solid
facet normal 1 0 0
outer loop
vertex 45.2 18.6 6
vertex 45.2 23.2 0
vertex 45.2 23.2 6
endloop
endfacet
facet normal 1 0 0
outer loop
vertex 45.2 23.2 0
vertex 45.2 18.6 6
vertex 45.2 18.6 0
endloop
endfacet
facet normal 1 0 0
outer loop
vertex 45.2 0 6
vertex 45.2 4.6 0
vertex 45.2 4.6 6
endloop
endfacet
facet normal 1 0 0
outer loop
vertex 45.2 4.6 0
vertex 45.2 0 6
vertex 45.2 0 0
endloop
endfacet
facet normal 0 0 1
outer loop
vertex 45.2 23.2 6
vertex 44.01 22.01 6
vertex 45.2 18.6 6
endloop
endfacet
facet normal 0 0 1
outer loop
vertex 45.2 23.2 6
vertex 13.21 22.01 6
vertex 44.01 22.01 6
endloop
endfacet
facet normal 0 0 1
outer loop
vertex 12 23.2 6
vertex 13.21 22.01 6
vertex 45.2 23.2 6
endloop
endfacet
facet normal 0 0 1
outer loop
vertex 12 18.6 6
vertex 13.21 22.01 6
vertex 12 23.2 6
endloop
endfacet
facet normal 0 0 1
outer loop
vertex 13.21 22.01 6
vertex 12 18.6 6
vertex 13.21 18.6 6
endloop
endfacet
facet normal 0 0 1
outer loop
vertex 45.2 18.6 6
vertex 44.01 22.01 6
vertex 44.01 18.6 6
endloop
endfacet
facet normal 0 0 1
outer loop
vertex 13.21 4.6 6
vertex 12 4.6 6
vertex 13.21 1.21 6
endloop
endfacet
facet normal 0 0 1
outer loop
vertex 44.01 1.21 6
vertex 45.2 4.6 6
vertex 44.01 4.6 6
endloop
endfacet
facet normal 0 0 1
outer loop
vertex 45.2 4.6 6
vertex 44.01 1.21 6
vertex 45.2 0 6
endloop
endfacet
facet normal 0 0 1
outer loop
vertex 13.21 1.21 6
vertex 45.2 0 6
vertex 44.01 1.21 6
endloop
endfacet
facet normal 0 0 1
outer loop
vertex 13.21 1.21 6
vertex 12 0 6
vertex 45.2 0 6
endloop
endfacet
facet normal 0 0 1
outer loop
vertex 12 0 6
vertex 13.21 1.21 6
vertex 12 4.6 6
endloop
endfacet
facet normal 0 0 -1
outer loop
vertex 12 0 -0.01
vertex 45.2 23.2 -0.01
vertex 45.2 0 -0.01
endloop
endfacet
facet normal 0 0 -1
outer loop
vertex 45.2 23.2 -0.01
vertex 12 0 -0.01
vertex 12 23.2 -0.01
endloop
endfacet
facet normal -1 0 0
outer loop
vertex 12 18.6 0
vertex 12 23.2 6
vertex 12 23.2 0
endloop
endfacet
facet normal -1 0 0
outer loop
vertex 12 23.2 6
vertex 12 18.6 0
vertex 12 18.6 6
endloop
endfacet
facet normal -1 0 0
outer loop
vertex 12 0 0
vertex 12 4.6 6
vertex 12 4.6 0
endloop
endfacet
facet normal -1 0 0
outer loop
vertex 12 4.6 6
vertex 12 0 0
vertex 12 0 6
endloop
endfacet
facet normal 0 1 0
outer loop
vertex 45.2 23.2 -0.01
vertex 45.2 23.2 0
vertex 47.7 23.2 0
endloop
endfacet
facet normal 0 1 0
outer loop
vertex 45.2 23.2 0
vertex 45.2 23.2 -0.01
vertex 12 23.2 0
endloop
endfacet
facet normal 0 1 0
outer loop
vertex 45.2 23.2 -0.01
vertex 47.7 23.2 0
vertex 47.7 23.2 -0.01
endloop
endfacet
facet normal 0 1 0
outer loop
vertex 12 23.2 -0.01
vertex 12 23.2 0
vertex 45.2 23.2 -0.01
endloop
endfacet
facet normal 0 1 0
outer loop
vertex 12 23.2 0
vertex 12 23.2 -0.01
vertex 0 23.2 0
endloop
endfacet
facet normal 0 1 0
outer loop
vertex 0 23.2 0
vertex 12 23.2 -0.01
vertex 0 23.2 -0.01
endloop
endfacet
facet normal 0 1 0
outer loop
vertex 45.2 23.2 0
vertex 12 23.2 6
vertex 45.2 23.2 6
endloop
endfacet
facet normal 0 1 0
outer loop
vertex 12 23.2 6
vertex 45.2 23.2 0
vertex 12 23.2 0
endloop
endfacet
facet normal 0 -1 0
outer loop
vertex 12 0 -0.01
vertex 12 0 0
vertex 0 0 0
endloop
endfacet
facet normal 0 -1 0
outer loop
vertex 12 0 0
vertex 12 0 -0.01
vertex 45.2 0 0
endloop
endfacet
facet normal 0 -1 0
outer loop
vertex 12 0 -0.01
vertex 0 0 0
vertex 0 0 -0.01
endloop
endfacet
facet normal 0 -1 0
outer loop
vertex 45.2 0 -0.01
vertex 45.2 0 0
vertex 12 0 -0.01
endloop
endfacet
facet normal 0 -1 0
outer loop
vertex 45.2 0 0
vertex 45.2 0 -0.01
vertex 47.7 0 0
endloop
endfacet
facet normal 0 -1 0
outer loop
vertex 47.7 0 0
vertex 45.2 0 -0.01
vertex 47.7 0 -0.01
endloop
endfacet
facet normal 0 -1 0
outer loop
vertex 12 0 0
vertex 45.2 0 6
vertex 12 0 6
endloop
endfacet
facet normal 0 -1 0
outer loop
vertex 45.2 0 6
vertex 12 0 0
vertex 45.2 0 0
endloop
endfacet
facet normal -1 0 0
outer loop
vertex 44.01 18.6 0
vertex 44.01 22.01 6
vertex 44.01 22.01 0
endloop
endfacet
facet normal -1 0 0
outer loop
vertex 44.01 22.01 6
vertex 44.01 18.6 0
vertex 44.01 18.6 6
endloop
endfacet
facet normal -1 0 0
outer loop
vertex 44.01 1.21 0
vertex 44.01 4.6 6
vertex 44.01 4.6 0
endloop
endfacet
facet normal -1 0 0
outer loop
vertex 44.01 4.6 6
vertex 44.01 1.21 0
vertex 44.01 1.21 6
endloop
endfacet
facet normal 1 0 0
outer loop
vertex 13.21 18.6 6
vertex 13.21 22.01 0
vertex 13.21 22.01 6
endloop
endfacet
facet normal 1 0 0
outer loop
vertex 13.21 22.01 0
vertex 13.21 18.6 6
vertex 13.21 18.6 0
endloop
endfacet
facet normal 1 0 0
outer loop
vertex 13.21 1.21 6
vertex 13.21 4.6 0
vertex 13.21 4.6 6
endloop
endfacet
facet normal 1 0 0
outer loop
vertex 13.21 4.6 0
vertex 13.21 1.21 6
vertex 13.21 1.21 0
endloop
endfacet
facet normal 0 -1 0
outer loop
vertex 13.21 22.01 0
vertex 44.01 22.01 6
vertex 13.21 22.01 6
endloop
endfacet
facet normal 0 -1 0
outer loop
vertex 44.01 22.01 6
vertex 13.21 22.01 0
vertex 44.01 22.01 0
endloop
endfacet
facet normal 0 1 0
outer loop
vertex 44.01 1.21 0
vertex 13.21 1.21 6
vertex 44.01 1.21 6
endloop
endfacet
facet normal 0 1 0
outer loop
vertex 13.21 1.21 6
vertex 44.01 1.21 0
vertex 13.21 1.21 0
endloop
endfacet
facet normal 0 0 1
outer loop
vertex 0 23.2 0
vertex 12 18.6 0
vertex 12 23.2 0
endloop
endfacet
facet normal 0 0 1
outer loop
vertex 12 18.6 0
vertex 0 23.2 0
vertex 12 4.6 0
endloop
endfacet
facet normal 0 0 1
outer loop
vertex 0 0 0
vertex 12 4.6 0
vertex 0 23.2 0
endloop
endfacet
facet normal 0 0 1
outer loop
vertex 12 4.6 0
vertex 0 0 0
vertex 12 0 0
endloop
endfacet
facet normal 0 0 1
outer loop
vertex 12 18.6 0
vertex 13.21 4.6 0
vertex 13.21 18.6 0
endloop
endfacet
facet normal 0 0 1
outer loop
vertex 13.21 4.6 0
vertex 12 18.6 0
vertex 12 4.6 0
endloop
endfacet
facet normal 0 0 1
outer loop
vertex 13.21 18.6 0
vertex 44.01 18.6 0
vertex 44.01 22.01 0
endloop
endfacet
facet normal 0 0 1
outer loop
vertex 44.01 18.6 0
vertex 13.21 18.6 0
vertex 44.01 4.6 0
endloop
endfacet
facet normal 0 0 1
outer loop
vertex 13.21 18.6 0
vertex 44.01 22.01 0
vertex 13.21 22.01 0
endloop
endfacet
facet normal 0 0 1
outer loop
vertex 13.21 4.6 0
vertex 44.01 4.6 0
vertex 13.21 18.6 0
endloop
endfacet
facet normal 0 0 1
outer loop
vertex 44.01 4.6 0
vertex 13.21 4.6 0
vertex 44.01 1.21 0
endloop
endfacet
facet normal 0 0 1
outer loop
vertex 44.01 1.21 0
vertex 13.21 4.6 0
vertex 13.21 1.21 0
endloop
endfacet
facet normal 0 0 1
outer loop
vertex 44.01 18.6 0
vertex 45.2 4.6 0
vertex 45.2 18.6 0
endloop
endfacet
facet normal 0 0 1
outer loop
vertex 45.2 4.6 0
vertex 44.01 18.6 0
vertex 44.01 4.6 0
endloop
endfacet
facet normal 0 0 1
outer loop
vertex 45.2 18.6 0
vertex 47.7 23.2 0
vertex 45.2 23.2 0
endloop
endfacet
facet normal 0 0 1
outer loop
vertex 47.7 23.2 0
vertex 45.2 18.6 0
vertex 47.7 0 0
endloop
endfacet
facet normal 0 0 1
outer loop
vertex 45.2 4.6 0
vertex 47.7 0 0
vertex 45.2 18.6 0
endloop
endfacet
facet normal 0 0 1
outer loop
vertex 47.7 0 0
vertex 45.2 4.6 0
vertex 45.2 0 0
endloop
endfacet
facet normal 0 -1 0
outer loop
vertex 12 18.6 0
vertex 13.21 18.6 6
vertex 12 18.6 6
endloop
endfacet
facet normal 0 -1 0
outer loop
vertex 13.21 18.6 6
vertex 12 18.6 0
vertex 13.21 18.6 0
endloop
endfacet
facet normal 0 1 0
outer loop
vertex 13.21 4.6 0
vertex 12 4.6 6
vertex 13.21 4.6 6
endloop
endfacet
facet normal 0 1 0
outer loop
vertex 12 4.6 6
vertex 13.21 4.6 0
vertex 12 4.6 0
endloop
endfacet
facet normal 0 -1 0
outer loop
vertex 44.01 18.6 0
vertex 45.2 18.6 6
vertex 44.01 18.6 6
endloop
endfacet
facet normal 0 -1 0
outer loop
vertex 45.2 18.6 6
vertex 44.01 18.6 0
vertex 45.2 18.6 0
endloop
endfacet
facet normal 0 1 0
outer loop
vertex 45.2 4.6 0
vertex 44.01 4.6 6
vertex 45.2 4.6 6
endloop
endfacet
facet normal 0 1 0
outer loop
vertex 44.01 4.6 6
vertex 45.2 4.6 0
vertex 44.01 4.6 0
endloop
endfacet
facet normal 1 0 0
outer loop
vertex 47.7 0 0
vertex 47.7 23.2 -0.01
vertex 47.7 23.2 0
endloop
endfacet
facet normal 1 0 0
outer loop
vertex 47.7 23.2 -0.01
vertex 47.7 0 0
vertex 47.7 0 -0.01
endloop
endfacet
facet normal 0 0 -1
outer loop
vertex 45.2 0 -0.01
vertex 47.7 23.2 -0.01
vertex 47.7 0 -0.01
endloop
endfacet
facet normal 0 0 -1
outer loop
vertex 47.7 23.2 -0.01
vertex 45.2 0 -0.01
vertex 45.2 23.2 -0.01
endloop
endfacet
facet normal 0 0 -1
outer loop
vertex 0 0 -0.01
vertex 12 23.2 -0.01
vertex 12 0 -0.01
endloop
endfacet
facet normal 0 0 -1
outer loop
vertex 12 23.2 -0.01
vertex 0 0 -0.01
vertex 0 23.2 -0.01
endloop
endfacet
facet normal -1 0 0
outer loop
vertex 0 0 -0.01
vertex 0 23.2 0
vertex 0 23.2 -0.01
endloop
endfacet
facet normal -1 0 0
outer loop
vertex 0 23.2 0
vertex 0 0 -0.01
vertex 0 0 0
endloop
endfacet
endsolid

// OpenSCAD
// file: ../Base/Boxes.scad
// Fischertechnik Box Foundation
// Pre-designed Boxes

use <Constants.scad>

include <PlacementOptions.scad>

box190Width = 190;
box190Depth = 130;
box130Width = 130;
box130Depth = 95;

// Values are from an original ec3 box
topBottomDifference = 1.5;
outerHeight = 40;
baseThickness = 1.8;
innerHeight = outerHeight - baseThickness;
stackExcess = 5.7;
radius = 3.5;
wallThickness = 1.5;
tolerance = 0.2;

boxWallThickness = wallThickness;
boxBaseThickness = baseThickness;
boxWebWidth = 3.0;

// getBoxWallThickness()
// Gets the wall thickness of a Fischertechnik Box
function getBoxWallThickness() = boxWallThickness;

// getBoxUsageHeight(height = 38.2)
// Gets the usable height of a Fischertechnik box
// height = Outer height of the box from the bottom to the upper edge.
function getBoxUsageHeight(height = outerHeight) = height - baseThickness - stackExcess;

// getBoxInnerHeight()
// Gets the inner height of a Fischertechnik box, including the stack excess
function getBoxInnerHeight() = innerHeight;

// getBoxBaseThickness()
// Gets the thickness of the Fischertechnik box base.
function getBoxBaseThickness() = boxBaseThickness;

// getBoxWebWidth()
// Gets the width of a box web
function getBoxWebWidth() = boxWebWidth;

// getBox190Space()
// Gets the usable inner space of a Box 190 as an x/y-list
function getBox190Space() = [
    box190Width - 2*getBoxWallThickness() - topBottomDifference, 
    box190Depth - 2*getBoxWallThickness() - topBottomDifference ];

// RoundedCornerPlate(width, depth, height, radius)
// Creates a body plate with rounded corners for a box. Used
// also to create the complete box with the hull module.
// width = Width of the plate
// depth = depth of the plate 
// height = thickness of the plate
// radius = radius of the rounded corner
module RoundedCornerPlate(width, depth, height, radius) {
    translate([radius, radius])
    hull() {
        w = width-2*radius;
        d = depth-2*radius;
        cube([w, d, height]);
        cylinder(height, r=radius, $fn=getFragments());
        translate([w, 0])
            cylinder(height, r=radius, $fn=getFragments());
        translate([w, d])
            cylinder(height, r=radius, $fn=getFragments());
        translate([0, d])
            cylinder(height, r=radius, $fn=getFragments());
    }
}

// BoxBase(width, depth)
// Creates an empty stackable Fischertechnik compatible box
// width = Outer width of the box (190, 130, ...)
// depth = Outer depth of the box (130, 95, ...)

module BoxBase(width, depth, height=outerHeight) {    
    thinPlate = 0.01;

    innerHeight = height - baseThickness;    
    
    module Body(tolerance=tolerance) {
        hull() {
            // Bottom with tolerance to fit into the original boxes when stacked
            translate([-wallThickness+tolerance, -wallThickness+tolerance, -baseThickness])
                RoundedCornerPlate(width-topBottomDifference-2*tolerance, depth-topBottomDifference-2*tolerance, thinPlate, radius);
            
            // Top
            translate([-wallThickness-topBottomDifference/2, -wallThickness-topBottomDifference/2, innerHeight-thinPlate])
                RoundedCornerPlate(width, depth, thinPlate, radius);
         }
    }

    module Cutoff() {
        hull() {
            coWidth = width - 2*wallThickness;
            coDepth = depth - 2*wallThickness;
            
            // Bottom
            RoundedCornerPlate(coWidth-topBottomDifference, coDepth-topBottomDifference, thinPlate, radius);

            // Top
            translate([-topBottomDifference/2, -topBottomDifference/2, innerHeight+thinPlate]) 
                RoundedCornerPlate(coWidth, coDepth, thinPlate, radius);
        }
    }
    
    difference() {        
        Body();
        Cutoff();
        stackOffset = innerHeight - stackExcess;
        translate([0, 0, stackOffset + baseThickness])
            Body(tolerance=0);
    }
}

// Creates the Fischertechnik empty box 130x190 mm and places it at position 0,0
// 190x130 are the outer sizes, the inner space is slightly smaller. Use getBox190Space() to get the inner sizes.
// The box is positioned that the usable inner space is at the 0,0,0 position.

module Box190() {
    BoxBase(box190Width, box190Depth);
}

// Gets the usable inner space of a Box 130 as an x/y-list
function getBox130Space() = [
    box130Width - 2*getBoxWallThickness() - topBottomDifference, 
    box130Depth - 2*getBoxWallThickness() - topBottomDifference ];

// Creates the Fischertechnik empty box 95x130 mm and places it at position 0,0
// 190x130 are the outer sizes, the inner space is slightly smaller. Use getBox190Space() to get the inner sizes.
// The box is positioned that the usable inner space is at the 0,0,0 position.

module Box130() {
    BoxBase(box130Width, box130Depth);
}

// Creates a web at the specified box walls
// corner 0 = LowerLeft, 1 = UpperLeft, 2 = UpperRight, 3 = LowerRight
// side 0 = LeftOfCorner, 1 = RightOfCorner
// distance = Distance in mm from the corner
// boxSpace = inner width and depth of the box (default: Box 190)
// webWidth = length of the web (default is 3 mms)
// webThickness = thickness of the web (default is 1 mm)
// height = Height of the web (standard is getBoxUsageHeight())
// sink = How much of the web is sunk into the wall

module BoxWeb(
    corner, 
    side, 
    distance, 
    boxSpace=getBox190Space(), 
    webWidth=getBoxWebWidth(), 
    webThickness=1.0, 
    height=getBoxUsageHeight(),
    sink = getBoxWallThickness()/2) {
    width = (corner % 2 == 0) ? 
            (side == LeftOfCorner ? webWidth : webThickness) :
            (side == LeftOfCorner ? webThickness : webWidth);

    depth = (corner % 2 == 0) ? 
            (side == RightOfCorner ? webWidth : webThickness) :
            (side == RightOfCorner ? webThickness : webWidth);
    
    xDiff = corner == LowerLeft ? 
                (side == LeftOfCorner ? -sink : distance) :
            (corner == UpperLeft ?                
                (side == LeftOfCorner ? distance : -sink) :
            (corner == UpperRight ?
                (side == LeftOfCorner ? boxSpace.x-webWidth+sink : boxSpace.x-distance-webThickness) :
                (side == LeftOfCorner ? boxSpace.x-distance-webThickness: boxSpace.x-webWidth+sink)));

    yDiff = corner == LowerLeft ? 
                (side == RightOfCorner ? -sink : distance) :
            (corner == UpperLeft ?
                (side == RightOfCorner ? boxSpace.y-distance-webThickness : boxSpace.y-webWidth+sink) :
            (corner == UpperRight ?
                (side == RightOfCorner ? boxSpace.y-webWidth+sink : boxSpace.y-distance-webThickness) :
                (side == RightOfCorner ? distance : -sink)));
    
    translate([xDiff, yDiff, -getExcess()])
        cube([width, depth, height + 2*getExcess()]);
}
// file: ../Base/Rotation.scad
// Fischertechnik Box Foundation
// Geometry Helpers Rotation

include <PlacementOptions.scad>

// getRotatedSpace(space, rotation=NoRotation)
// Rotates the space dependent on the specified rotation

function getRotatedSpace(space, rotation=NoRotation) = [
    (rotation == Rotate90 || rotation == Rotate270) ? space.y : space.x,
    (rotation == Rotate90 || rotation == Rotate270) ? space.x : space.y
];

// Rotates the given space around the fixed left lower corner
// space = the space the children needs as width/depth list [width,depth]
// rotation = 0 Rotate0 degrees, 1 Rotate90 degrees, 2 Rotate180 degrees, 3 Rotate270 degrees (equivalent to -90)

module RotateFix(space, rotation=NoRotation) {
    dy = (rotation == Rotate0 || rotation == Rotate270) ? 0 :
        (rotation == Rotate90) ? space.x :
        space.y;
    dx = (rotation < Rotate180) ? 0 :
        (rotation == Rotate180) ? space.x :
        space.y;
    
    translate([dx, dy, 0])
        rotate([0, 0, rotations[rotation]])
            children();
}
// file: ../Base/Alignment.scad
// Fischertechnik Box Foundation
// Geometry Helpers Alignment

include <PlacementOptions.scad>

// getAlignedX(elementWidth, spaceWidth, align=AlignRight, offset=0)
// Gets the aligned X offset of an element with the given
// width in the given space.
// elementWidth = The width of the element to positon
// spaceWidth = The space where the element should be aligned
// align = 0 AlignLeft, 1 AlignCenter, 2 AlignRight
// offset = an optional offset from the aligned position. When
// aligned left or centered, then positive values are in X direction.
// When aligned right then positive values are in negative X direction.

function getAlignedX(elementWidth, spaceWidth, align=AlignRight, offset=0) =
    (align == AlignLeft) ?
        offset :
        ((align == AlignCenter) ?
        (spaceWidth - elementWidth)/2 + offset :
        spaceWidth - offset - elementWidth);

// getAlignedY(elementDepth, spaceDepth, align=AlignTop, offset=0)
// Gets the aligned Y offset of an element with the given
// depth in the given space.
// elementDepth = The depth of the element to positon
// spaceDepth = The space where the element should be aligned
// align = 0 AlignBottom, 1 AlignCenter, 2 AlignTop
// offset = an optional offset from the aligned position. When
// aligned bottom or centered, then positive values are in Y direction.
// When aligned top then positive values are in negative Y direction.

function getAlignedY(elementDepth, spaceDepth, align=AlignTop, offset=0) =
    (align == AlignBottom) ?
        offset :
        ((align == AlignCenter) ?
        (spaceDepth - elementDepth)/2 + offset :
        spaceDepth - offset - elementDepth);
// file: ../Base/PlacementOptions.scad
// Fischertechnik Box Foundation
// Placement Options

// Alignment
NoAlign = 0;
AlignLeft = 1;
AlignBottom = 2;
AlignCenter = 3;
AlignRight = 4;
AlignTop = 5;

// Element rotation degree steps
rotations = [0, -90, -180, -270];

// Rotation
NoRotation = 0;
Rotate0 = 0;
Rotate90 = 1;
Rotate180 = 2;
Rotate270 = 3;

// Docking (seen from above)
NoDock = -1;
DockLeft = 0;
DockTop = 1;
DockRight = 2;
DockCorner = 2;
DockBottom = 3;

// Web corners
LowerLeft = 0;
UpperLeft = 1;
UpperRight = 2;
LowerRight = 3;

// Web position relative to corner
LeftOfCorner = 0;
RightOfCorner = 1;

// Rails direction
Horizontal = true;
Vertical = false;
// file: ../Base/Placement.scad
// Fischertechnik Box Foundation
// Geometry Helpers Placement

use <Constants.scad>
use <Alignment.scad>
use <Rotation.scad>
use <Boxes.scad>

include <PlacementOptions.scad>

// Place(x=0, y=0, elementSpace=[0,0], alignX=AlignLeft, alignY=AlignBottom, rotation=Rotate0, boxSpace=getBox190Space())
// Places the child at the specified position
// y = Y-Position. This is a relative position when an X aligment is specified.
// x = X-Position. This is a relative position when an Y aligment is specified.
// elementSpace = space of the element to be placed [x,y]
// alignX = -1=NoAlign, 0 AlignLeft, 1 AlignCenter, 3 AlignRight (elementSpace and boxSpace required!)
// alignY = -1=NoAlign, 2 AlignBottom, 1 AlignCenter, 4 AlignTop (elementSpace and boxSpace required!)
// rotation = 0 Rotate0 0 degrees, 1 Rotate90 90 degrees, 
// 2 Rotate180 180 degrees, 3 Rotate270 270 degrees (equivalent to -90)
// boxSpace = Inner space of the box where the placement occurs [x,y] - default is Box 190x130 inner space

module Place(x=0, y=0, elementSpace=[0,0], 
  alignX=AlignLeft, alignY=AlignBottom, 
  rotation=NoRotation, boxSpace=getBox190Space()) {

    module Position(x, y, space, rotation=Rotate0) {
        translate([x, y, 0])
            RotateFix(space, rotation)
                children();
    }

    space = getRotatedSpace(elementSpace, rotation);
    alignedX = getAlignedX(space.x, boxSpace.x, alignX, x);
    alignedY = getAlignedY(space.y, boxSpace.y, alignY, y);
    Position(alignedX, alignedY, elementSpace, rotation)
        children();
}

// Center(space=getBox130Space(), elementSpace=[0,0])
// space = Space where the children is centered. For cylinder use centered=true and no elementSpace.
// elementSpace = space of the element to be centered [x,y]

module Center(space=getBox190Space(), elementSpace=[0,0]) {
    Place(elementSpace=elementSpace, boxSpace=space, alignX=AlignCenter, alignY=AlignCenter)
        children();
}

// CenterHorizontal(width=0, y=0, offset=0, space=getBox130Space())
// width = Width of the element to be placed.
// y = Y position of the element
// offset = Offset from the center position (negative will be left of the center)
// space = Space where the element is placed

module CenterHorizontal(width=0, y=0, offset=0, space=getBox190Space()) {
    Place(x=offset, y=y, elementSpace=[width, 0], boxSpace=space, alignX=AlignCenter)
        children(0);
}

// CenterVertical(depth=0, x=0, offset=0, space=getBox130Space())
// depth = Depth of the element to be placed.
// x = X position of the element
// offset = Offset from the center position (negative will be down of the center)
// space = Space where the element is placed

module CenterVertical(depth=0, x=0, offset=0, space=getBox190Space()) {
    Place(x=x, y=offset, elementSpace=[0, depth], boxSpace=space, alignY=AlignCenter)
        children(0);
}

// getIsVertical(align)
// True if the specified alignment needs a vertical orientation for a divider (AlignRight, AlignLeft)

function getIsVertical(align) = (align == AlignRight || align == AlignLeft);

// getIsHorizontal(align)
// True if the specified alignment needs a horizontal orientation for a divider (AlignTop, AlignBottom)

function getIsHorizontal(align) = (align == AlignTop || align == AlignBottom);
// file: ../Base/Constants.scad
// Fischertechnik Box Foundation
// Constants

// Constant values necessary for multiple elements

// Base constants
dividerThickness = 1.2;
excess = 0.01;
fragments = 90;
tolerance = 0.8;

// Gets the thickness of a divider 
function getDividerThickness() = dividerThickness;

// Gets the excess that is used to merge walls into each other
function getExcess() = excess;

// Gets amount of fragments of a cylinder
function getFragments() = fragments;

// Gets the inner tolerance of a frame to each side
function getTolerance() = tolerance;


// Fischertechnik specific constants
axisDiameter = 4;
axisBottomDiameter = axisDiameter + 1;
axisTolerance = 0.2;
axisLockingLength = 8;

// Gets axis diameter of Fischertechnik axis
function getAxisDiameter() = axisDiameter;

// Gets axis diameter tolerance (subtracted for element axis)
function getAxisTolerance() = axisTolerance;

// Gets the axis diameter for standing axis
function getStandAxisDiameter() = getAxisDiameter() - getAxisTolerance();

// Gets axis bottom diameter for thicker part at the bottom
function getAxisBottomDiameter() = axisBottomDiameter;

// Gets the lengthh of the locking part of a locking axis
function getAxisLockingLength() = axisLockingLength;

// Studs

studHeight = 2.5;
studTolerance = 0.2;

// gets the height of a connecting stud
function getStudHeight() = studHeight;

// gets the connecting stud height tolerance
function getStudTolerance() = studTolerance;

// Dockable Frame with Edge

standardEdgeDistance = 2.5;
standardWebDistance = 11.5;
standardCornerLength = 15;

// gets the standard distance to the wall of the box for dockable frames with webs
function getStandardEdgeDistance() = standardEdgeDistance;

// gets the standard distance of each web to the corner of the dockable frame
function getStandardWebDistance() = standardWebDistance;

// gets the standard length of the corner walls of a dockable frame
function getStandardCornerLength() = standardCornerLength;

// Tubes

tubeWallFactor = 0.8;

// gets the wall thickness of a tube.
function getTubeWallThickness() = tubeWallFactor * getDividerThickness();

// Small Parts and Divider Frame

smallPartsFrameHeight = 20;

// gets the frame height for docked small parts boxes.
function getSmallPartsFrameHeight() = smallPartsFrameHeight;

// Hubs

hubRingDiameter = 19.5;
hubRingLevelDiameter = 21;

// gets the diameter of a tube matching the inner ring of a wheel
function getHubRingDiameter() = hubRingDiameter;

// gets the diameter of a hub tube with a thicker diameter
function getHubRingLevelDiameter() = hubRingLevelDiameter;

// Struts

strutAddLength = 9.0;
strutDepth = 8.0;

// gets the full length of a strut
function getFullStrutLength(length) = length + strutAddLength;

// gets the radius of the end of a strut
function getStrutEndRadius() = strutAddLength / 2;

// gets the the depth of a strut
function getStrutDepth() = strutDepth;
// main file
// Fischertechnik Box Library
// Frame for mini-motor
// 31062, 137096

use <../Base/Constants.scad>
use <../Base/Placement.scad>
use <../ModelBase/Simple.scad>

include <../Base/PlacementOptions.scad>

/* [Hidden] */
width = 30;
depth = 20;
height = 6;
wormDepth = 12;

volume = [width, depth, height];

// getFrameMiniMotorSpace()
// Gets the space for a mini motor including the stud and the worm

function getFrameMiniMotorSpace() = getFrameOuterVolume([width + getStudHeight() + wormDepth, depth, height]);

// FrameMiniMotor()
// Frame for mini motor

module FrameMiniMotor() {
    Space(getFrameMiniMotorSpace());
    translate([wormDepth, 0]) {
        difference() {
            Frame([width, depth, height]);
            cutoff = 14;
            cutoffVolume = [2*getDividerThickness(), cutoff, height + getExcess()];
            translate([-getDividerThickness()/2, (getFrameOuterVolume(volume).y - cutoff)/2])
                cube(cutoffVolume);
            translate([
                getFrameOuterVolume(volume).x - getDividerThickness() - getDividerThickness()/2, 
                (getFrameOuterVolume(volume).y - cutoff)/2])
                cube(cutoffVolume);
        }
    }
}

// test
color("lightgray")
FrameMiniMotor();
